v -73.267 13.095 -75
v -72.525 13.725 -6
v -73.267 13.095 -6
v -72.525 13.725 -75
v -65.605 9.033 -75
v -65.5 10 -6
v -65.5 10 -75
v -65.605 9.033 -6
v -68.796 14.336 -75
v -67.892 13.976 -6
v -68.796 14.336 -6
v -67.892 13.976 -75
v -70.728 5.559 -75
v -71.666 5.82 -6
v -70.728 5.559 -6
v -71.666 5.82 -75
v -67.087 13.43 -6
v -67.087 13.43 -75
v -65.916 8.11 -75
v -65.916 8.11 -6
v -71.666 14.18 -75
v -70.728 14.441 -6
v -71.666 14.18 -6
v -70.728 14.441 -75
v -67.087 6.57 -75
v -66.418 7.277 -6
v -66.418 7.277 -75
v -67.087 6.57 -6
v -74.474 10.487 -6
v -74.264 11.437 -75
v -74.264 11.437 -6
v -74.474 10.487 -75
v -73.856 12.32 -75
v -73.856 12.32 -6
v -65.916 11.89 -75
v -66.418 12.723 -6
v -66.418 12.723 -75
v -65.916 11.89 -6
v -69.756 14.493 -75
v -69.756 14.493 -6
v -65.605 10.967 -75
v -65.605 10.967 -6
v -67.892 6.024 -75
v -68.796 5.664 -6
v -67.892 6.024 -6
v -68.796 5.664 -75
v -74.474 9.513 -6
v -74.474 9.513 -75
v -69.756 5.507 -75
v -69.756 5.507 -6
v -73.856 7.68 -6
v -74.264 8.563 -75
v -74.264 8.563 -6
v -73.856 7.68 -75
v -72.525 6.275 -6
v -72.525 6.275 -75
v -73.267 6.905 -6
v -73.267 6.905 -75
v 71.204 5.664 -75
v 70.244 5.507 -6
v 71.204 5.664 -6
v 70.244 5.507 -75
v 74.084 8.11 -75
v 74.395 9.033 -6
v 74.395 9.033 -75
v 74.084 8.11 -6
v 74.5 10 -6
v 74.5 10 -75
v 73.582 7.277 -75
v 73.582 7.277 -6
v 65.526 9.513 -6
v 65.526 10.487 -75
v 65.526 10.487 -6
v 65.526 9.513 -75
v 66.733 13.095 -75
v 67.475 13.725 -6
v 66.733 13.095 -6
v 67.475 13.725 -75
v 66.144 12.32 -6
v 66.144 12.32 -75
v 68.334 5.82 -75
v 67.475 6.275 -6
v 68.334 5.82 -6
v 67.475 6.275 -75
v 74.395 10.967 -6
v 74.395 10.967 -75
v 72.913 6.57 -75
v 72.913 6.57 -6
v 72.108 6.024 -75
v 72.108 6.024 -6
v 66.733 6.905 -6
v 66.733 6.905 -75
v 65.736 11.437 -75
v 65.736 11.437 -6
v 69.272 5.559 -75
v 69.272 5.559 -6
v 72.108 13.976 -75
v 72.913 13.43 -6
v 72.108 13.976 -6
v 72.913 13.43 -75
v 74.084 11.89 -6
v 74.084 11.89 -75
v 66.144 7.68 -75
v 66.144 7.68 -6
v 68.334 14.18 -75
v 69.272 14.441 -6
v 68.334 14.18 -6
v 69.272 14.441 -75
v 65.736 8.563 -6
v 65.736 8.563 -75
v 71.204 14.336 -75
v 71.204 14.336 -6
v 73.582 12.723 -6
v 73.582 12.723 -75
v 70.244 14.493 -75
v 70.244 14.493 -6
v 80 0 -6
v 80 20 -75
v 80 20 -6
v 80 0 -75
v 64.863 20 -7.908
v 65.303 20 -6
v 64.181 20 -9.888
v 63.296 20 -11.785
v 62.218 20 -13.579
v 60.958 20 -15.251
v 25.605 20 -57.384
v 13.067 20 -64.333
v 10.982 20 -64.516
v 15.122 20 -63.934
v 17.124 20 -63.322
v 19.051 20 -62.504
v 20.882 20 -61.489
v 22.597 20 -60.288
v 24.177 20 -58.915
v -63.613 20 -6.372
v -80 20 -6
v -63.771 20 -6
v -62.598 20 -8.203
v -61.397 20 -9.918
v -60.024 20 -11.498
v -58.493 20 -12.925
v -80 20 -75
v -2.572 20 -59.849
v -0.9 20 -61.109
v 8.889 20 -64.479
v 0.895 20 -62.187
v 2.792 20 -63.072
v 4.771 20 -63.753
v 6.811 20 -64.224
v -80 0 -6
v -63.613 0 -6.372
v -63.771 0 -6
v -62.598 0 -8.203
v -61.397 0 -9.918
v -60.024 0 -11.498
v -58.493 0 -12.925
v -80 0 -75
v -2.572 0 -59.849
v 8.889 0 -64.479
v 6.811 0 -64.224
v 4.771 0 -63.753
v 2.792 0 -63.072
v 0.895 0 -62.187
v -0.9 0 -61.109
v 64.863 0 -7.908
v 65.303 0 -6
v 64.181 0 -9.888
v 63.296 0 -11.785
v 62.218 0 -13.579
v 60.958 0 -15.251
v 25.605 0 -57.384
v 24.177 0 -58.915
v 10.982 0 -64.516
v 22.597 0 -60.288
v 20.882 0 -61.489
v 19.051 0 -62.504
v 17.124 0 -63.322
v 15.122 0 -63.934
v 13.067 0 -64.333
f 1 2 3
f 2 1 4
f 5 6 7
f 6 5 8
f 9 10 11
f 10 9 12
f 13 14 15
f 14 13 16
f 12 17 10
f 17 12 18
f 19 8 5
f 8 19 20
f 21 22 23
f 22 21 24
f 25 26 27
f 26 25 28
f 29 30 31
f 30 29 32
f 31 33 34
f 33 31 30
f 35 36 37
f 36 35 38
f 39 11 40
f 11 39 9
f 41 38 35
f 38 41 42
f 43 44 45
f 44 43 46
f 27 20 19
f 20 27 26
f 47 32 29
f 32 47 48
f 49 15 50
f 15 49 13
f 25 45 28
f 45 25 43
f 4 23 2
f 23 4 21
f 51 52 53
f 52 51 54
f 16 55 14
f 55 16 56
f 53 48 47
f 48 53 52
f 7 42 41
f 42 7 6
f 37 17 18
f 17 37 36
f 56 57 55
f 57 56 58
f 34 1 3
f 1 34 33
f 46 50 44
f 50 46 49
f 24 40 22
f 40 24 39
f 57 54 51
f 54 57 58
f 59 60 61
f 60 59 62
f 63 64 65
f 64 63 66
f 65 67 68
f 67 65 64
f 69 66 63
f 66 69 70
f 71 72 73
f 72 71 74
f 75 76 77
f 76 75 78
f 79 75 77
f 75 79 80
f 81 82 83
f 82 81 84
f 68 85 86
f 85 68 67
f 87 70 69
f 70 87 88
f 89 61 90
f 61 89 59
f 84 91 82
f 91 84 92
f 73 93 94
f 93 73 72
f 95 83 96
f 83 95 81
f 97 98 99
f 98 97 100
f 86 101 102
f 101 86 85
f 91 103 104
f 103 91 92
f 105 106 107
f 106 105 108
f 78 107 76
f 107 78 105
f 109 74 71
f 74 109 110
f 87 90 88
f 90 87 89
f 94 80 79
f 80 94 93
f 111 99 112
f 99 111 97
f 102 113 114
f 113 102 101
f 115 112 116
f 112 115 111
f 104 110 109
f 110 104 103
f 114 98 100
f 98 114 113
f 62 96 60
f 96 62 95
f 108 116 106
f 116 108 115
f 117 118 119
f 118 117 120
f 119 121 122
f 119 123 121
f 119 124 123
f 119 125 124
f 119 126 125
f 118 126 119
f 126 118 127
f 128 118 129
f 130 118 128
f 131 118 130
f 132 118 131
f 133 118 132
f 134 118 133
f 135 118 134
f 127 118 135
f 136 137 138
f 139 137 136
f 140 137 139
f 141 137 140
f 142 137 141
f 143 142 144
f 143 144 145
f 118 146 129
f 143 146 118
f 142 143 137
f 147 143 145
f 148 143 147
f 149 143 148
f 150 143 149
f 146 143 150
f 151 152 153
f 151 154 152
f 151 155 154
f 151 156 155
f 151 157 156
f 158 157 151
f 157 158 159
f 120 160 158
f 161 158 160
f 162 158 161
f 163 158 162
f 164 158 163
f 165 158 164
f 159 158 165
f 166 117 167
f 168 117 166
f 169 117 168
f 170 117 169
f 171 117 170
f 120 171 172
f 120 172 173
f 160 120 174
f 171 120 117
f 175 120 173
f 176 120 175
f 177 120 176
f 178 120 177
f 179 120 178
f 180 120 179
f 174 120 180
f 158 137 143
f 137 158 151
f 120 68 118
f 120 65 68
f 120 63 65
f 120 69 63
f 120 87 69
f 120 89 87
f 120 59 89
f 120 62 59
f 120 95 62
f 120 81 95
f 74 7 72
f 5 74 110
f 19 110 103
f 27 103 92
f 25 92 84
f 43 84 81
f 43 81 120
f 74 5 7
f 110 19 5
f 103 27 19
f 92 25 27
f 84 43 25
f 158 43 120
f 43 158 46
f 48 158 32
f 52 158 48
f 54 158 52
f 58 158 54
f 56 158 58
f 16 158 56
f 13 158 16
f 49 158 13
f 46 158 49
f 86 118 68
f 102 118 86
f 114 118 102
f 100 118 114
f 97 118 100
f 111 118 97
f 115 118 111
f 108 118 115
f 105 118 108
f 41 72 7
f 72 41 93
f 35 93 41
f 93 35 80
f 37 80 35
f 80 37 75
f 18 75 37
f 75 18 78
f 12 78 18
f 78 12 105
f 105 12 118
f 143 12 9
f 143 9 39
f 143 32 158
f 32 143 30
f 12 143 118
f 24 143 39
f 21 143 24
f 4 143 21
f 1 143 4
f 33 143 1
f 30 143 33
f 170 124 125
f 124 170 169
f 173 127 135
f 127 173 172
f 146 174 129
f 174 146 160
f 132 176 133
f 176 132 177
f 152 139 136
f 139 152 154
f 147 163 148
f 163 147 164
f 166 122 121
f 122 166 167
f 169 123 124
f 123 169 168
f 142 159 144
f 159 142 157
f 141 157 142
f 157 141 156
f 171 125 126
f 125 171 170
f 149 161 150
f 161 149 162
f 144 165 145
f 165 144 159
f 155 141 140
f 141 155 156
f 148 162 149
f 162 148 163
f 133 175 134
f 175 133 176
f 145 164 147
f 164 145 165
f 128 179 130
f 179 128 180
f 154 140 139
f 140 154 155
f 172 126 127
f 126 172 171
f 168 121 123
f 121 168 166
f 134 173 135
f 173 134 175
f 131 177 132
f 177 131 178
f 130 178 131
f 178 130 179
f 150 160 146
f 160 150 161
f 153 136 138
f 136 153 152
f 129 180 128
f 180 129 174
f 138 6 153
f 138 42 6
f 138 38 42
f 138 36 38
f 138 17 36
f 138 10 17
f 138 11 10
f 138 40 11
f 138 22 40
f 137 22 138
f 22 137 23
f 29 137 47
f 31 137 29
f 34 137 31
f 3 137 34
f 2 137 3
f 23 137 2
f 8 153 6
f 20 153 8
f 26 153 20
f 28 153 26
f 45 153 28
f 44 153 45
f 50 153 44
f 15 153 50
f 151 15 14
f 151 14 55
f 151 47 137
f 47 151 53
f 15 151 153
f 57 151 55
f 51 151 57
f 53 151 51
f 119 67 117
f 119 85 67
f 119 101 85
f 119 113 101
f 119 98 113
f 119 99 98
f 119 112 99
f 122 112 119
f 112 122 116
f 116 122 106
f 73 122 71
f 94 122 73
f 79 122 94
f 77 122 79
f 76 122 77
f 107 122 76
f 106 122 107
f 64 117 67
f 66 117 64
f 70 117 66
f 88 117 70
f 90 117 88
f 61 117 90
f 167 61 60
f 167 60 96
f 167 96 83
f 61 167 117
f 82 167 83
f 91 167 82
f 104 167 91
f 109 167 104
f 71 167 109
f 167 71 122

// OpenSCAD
use <../../config.scad>
use <../../libs/gears.scad>
use <gps_volant.scad>

$fs=$fs/2;
$fa=$fa/2;

n=3;
d = 150;
d2 =152;


e = 3;


//modul = 2; tooth_number1 = 20; tooth_number2 = 92;
//modul = 2.5; tooth_number1 = 20; tooth_number2 = 72;
modul = 3; tooth_number1 = 24; tooth_number2 = 60; //old 60

pressure_angle = 20;
//pressure_angle = 20;
helix_angle = 0;

//5120
lg_int = 47;
lg_int2 = 13;
h_int = 5;
a = 30;
colonne_d=56;
d_case = 145;

//same
//0 same
//1 5120
//2 mk3
tracteur = 0;




l = lg_int+10;
h2=h_int+5;

r_vis = 4.2;
e_support = 5;


/**
 * SAME
 **/

lg_same_int = 25;
h_same_int = 30;
l_same = lg_same_int+30;
d_same = 120;
same_ang = 25;

module couronne_same(){
    couronne1(d_same, 25, 8);
}

module support_couronne_same(){
    difference(){
        union(){
            translate([-l_same/2-6,-6,0])cube([l_same+12, 12, e_support]);
        }
        translate([-l_same/2,0,-1])  m8(200);
        translate([ l_same/2,0,-1])  m8(200);
    }
}

module support_couronne_same2(){
    difference(){
        union(){
            translate([-l_same/2-6,-8,0])cube([l_same+12, 16, e_support]);
            hull(){
                translate([-lg_same_int/2-6,-8,0])cube([lg_same_int+12, 2, h_same_int+3]);
                translate([-lg_same_int/2-6,6,0])cube([lg_same_int+12, 2, h_same_int+3+16*sin(a)]);
            }
        }
        translate([-l_same/2,0,-1])  m8(200);
        translate([ l_same/2,0,-1])  m8(200);
        translate([0,-12,6]) rotate([a,0,0])cube([lg_same_int, 100, h_same_int+1], center = true);
    }
}

module support_couronne_same3(){
    l_support = 50;
    difference(){
        union(){
            hull(){
                translate([-l_support/2,0,0]) cylinder(r=8,e_support);
                translate([ l_support/2,0,0]) cylinder(r=8,e_support);
            }
        }
        translate([-l_support/2,0,-1])  m8(200);
        translate([-10,0,-1])  m8(200);
        translate([ 10,0,-1])  m8(200);
        translate([ l_support/2,0,-1])  m8(200);
    }
}


x_vis_same = 140;
x_vis_2 = 100;

module support_colonne_same2(){
    e = 20;
    lg_int = 95;
    l_int = 113;
    de=20;
    r  = 20;
    l = 160;
    lg= 70;
    x_vis2 = 140;
    a = -50;//-55
    
    difference(){
        union(){
            translate([-l/2, 5, 0])cube([l, lg, e]);
            
        }
        translate([0, 0, -1]) rotate([0,0,a])cube_arrondi(lg_int, l_int, e+3, r);
            
        for(i=[-1,1]){
            translate([i*x_vis2/2, -100, e/2]) rotate([-90,0,0]) cylinder(200, r=4.5);
        }
        
        cube([l+4, 12, 150], center = true);
    }
}

module support_colonne_same(){
    support_colonne_same2();
    rotate([0,0,180])support_colonne_same2();
}

module support_colonne_same3(){
    rotate([-90,0,0])support_colonne_same2();
}



    
/**
 * Common
 **/



module couronne(mode2){
    if(mode2 == 0){
        couronne_same();
        for(i=[0:n]){
            rotate([0,0,(i+0.5)*360/n]) translate([0,-d2/2+6,-1]) translate([0,0,h2+1.5])  rotate([0,0,180])support_couronne_same2();
        }
        rotate([0,0,360*3/6]) translate([0,d2/2,-1]) translate([0,0,h2+1.5])  rotate([0,0,180])support_couronne_same3();
    } else if(mode2 == 1){
        couronne_same();
    } else if(mode2 == 2){
        translate([0, 00, 8]) rotate([-90,0,0]) support_couronne_same2();
        translate([0, 45, 8]) rotate([-90,0,0]) support_couronne_same2();
        translate([0, 90, 8]) rotate([-90,0,0]) support_couronne_same2();
    }
}

mode=6;
if(mode==0){
    couronne(mode);
    
    translate([0,125,5]) rotate([-180,0,8]) pignon2();
    
    
    
    translate([0,0,-160]) support_colonne_same2();
    translate([0,0,-160]) rotate([0,0,180]) support_colonne_same2();
    translate([0,75,-160]) support_colonne2();

    translate([0,120,-25])rotate([-180,0,180]) support_moteur1();
    
} else if(mode==1){
   couronne(mode);
} else if(mode==2){
   couronne(2);
}  else if(mode==3){
   couronne(3);
} else if(mode==4){
   pignon2();
} else if(mode==5){
   rotate([0,0, 0])support_moteur1();
} else if(mode==6){
   rotate([0,0, 0]) rotate([-90,0,0])support_colonne_same2();
}
